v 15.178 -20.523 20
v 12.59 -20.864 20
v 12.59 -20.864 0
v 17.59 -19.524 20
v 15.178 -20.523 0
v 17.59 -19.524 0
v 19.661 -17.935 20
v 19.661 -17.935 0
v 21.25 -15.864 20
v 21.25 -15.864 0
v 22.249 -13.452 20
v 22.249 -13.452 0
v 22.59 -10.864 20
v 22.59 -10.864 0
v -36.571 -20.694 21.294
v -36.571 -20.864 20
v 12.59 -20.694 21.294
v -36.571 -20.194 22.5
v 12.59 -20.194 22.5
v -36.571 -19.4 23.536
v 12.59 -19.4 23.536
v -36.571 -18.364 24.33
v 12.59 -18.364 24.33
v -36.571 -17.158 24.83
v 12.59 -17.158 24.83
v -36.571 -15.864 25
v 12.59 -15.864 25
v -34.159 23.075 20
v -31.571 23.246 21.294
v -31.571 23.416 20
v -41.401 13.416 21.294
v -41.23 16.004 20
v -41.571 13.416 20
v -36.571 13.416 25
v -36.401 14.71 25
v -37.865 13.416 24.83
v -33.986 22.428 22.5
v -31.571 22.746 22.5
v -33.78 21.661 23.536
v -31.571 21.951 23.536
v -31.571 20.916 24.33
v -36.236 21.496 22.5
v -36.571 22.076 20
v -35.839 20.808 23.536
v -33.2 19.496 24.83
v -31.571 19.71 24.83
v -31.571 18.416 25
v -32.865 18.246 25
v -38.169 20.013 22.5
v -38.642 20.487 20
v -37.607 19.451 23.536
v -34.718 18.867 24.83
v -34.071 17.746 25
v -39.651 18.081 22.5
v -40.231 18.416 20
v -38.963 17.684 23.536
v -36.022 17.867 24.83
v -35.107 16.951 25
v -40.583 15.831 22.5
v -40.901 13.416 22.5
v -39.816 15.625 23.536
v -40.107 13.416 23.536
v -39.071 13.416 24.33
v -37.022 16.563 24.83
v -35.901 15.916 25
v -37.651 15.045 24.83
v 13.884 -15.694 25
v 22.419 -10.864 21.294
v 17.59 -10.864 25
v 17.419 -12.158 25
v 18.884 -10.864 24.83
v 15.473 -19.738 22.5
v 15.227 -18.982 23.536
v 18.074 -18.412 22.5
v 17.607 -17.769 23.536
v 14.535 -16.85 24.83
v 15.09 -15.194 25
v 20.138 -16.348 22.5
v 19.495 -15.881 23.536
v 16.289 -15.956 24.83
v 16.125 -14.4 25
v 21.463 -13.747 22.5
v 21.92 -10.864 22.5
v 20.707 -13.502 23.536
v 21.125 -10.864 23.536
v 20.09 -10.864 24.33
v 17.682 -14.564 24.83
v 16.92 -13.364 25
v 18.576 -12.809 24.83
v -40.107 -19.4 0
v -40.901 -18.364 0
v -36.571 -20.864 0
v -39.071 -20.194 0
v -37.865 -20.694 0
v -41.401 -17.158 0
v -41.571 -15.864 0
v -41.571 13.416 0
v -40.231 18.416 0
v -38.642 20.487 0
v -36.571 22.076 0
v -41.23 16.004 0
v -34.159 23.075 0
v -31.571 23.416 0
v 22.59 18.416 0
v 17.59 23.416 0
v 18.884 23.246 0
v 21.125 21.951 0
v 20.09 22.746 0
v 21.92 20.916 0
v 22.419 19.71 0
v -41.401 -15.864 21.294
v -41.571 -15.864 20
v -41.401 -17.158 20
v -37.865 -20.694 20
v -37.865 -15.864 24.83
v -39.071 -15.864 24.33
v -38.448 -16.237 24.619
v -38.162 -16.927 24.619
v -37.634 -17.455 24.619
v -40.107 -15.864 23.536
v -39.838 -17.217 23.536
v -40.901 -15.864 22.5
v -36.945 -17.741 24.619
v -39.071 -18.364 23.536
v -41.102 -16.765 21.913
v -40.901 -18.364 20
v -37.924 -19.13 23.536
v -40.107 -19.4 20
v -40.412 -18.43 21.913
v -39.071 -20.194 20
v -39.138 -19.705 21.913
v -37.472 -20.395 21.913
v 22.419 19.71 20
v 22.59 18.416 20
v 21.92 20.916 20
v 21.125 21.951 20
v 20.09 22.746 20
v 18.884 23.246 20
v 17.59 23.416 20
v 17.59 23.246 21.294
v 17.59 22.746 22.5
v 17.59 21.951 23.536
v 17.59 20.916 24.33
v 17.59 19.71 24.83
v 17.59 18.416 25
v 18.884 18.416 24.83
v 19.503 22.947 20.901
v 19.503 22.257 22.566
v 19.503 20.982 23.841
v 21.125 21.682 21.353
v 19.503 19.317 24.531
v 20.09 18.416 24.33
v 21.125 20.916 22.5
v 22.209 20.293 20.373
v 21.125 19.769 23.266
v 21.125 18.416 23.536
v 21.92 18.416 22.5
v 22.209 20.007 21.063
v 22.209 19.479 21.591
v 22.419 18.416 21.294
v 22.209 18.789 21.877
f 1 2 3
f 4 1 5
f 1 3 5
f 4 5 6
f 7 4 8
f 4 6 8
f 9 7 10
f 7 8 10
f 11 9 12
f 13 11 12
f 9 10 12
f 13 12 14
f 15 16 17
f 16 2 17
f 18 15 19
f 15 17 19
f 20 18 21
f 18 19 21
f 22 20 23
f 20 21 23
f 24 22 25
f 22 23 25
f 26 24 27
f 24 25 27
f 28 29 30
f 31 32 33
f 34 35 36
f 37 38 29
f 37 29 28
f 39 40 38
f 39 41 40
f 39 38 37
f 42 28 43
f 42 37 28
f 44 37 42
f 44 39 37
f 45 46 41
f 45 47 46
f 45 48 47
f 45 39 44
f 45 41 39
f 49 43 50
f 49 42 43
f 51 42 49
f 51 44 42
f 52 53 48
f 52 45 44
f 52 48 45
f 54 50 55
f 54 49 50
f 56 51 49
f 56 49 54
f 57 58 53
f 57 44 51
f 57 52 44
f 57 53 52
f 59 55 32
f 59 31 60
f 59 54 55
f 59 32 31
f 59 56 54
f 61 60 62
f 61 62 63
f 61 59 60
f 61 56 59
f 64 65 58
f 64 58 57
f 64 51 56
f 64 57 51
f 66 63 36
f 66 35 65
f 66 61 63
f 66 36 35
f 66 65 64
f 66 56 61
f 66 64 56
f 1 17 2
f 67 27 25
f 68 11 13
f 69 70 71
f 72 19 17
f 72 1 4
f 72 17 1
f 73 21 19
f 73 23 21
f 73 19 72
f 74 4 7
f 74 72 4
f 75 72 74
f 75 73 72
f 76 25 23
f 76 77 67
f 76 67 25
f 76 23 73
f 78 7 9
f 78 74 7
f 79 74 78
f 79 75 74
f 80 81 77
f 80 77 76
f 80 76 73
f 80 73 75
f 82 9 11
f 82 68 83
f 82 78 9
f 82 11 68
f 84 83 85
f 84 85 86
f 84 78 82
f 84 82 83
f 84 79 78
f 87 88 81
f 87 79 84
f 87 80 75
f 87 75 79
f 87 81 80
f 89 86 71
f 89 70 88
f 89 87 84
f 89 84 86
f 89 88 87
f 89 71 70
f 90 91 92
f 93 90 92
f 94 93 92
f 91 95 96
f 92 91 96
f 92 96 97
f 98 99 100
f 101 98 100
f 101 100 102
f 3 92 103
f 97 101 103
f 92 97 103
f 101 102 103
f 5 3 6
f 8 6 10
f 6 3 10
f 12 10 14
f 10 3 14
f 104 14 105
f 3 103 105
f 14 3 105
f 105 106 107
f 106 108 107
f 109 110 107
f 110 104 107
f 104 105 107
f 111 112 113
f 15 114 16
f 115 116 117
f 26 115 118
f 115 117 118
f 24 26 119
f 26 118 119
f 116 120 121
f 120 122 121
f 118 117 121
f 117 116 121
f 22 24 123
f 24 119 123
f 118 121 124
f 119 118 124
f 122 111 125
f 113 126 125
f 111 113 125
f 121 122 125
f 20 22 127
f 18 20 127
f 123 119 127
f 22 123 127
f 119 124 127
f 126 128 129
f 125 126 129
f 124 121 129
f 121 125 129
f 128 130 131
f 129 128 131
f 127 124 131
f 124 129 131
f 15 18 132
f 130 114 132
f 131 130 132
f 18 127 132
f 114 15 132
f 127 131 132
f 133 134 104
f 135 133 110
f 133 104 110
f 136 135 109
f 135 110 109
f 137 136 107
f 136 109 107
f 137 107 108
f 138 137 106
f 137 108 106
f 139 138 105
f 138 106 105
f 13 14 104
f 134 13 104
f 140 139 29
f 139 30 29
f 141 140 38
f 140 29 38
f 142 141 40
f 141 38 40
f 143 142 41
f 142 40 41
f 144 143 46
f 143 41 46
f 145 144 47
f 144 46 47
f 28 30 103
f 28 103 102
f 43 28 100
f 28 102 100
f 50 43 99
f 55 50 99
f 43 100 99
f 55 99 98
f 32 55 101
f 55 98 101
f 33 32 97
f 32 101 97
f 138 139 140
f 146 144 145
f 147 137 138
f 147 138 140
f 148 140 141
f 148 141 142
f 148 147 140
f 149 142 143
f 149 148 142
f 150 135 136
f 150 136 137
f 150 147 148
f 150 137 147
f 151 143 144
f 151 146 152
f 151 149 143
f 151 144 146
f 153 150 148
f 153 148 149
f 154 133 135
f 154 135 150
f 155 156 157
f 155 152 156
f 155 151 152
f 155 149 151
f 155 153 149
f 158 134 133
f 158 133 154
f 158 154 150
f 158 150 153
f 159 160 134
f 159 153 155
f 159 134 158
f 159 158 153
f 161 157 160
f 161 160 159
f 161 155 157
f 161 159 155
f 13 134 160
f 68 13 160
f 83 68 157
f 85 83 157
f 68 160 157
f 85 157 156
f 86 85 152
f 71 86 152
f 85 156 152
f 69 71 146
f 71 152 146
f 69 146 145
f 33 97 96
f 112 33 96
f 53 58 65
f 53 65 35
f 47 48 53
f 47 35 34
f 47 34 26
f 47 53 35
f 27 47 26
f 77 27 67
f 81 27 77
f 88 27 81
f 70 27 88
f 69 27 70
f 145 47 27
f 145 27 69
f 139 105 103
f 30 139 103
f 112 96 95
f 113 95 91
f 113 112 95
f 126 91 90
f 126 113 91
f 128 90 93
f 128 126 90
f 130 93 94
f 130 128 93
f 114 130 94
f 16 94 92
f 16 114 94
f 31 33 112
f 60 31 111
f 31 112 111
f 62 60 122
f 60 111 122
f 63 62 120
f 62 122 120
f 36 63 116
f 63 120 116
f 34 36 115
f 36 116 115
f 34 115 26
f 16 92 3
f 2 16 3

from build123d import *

# Parameters (mm, degrees)
F1_DEPTH    = 25
F2_R        = 5
F3_T1_DEPTH = 32.5
F3_S5_W     = 5
F3_S5_H     = 5
F3_T6_DEPTH = 5


# Not quite as in the source:
# - a fillet or chamfer that OpenCascade refuses, or shapes differently, is made with other operations: its cross-section is extruded or revolved along the edge and cut away or added


with BuildPart() as f1:
    # F0 (on Top) → F1 (new body)
    with BuildSketch(Plane.XY):
        with BuildLine():
            Line((22.5896425545, 23.4159377009), (-31.5712185204, 23.4159377009))
            ThreePointArc((-31.5712185204, 23.4159377009), (-38.6422863323, 20.4870055127), (-41.5712185204, 13.4159377009))
            Line((-41.5712185204, 13.4159377009), (-41.5712185204, -20.8640433848))
            Line((-41.5712185204, -20.8640433848), (12.5896425545, -20.8640433848))
            ThreePointArc((12.5896425545, -20.8640433848), (19.6607103664, -17.9351111967), (22.5896425545, -10.8640433848))
            Line((22.5896425545, -10.8640433848), (22.5896425545, 23.4159377009))
        make_face()
    extrude(amount=F1_DEPTH)

    # F2
    f2_edges = [f1.edges().sort_by_distance(p)[0] for p in [
        (-41.571219, -20.864043, 12.5),
        (-41.571219, -3.724053, 25),
        (-14.490788, -20.864043, 25),
    ]]
    fillet(f2_edges, radius=F2_R)

    # F3: fillet of radius 5 on 1 edges, made by hand

    # F3_s2 → F3_t1 (cut)
    with BuildSketch(Plane.XY.offset(-12.5)):
        with BuildLine():
            ThreePointArc((22.5896425545, 18.4159377009), (21.1251764605, 21.9514716068), (17.5896425545, 23.4159377009))
            Line((17.5896425545, 23.4159377009), (22.5896425545, 23.4159377009))
            Line((22.5896425545, 23.4159377009), (22.5896425545, 18.4159377009))
        make_face()
    extrude(amount=F3_T1_DEPTH, mode=Mode.SUBTRACT)


with BuildPart() as f3_tool4:
    # F3_s5 → F3_t6 (new body)
    with BuildSketch(Plane.YZ.offset(17.5896425545)):
        with Locations((20.9159377009, 22.5)):
            Rectangle(F3_S5_W, F3_S5_H)
    extrude(amount=F3_T6_DEPTH)

    # F3_s7 → F3_t8 (revolve, cut)
    with BuildSketch(Plane(origin=(17.5896425545, 18.4159377009, 20), x_dir=(0, -0.7071067812, -0.7071067812), z_dir=(0, -0.7071067812, 0.7071067812))):
        with BuildLine():
            ThreePointArc((0, -5), (5, 0), (0, 5))
            Line((0, 5), (0, -5))
        make_face()
    revolve(axis=Axis((17.5896425545, 18.4159377009, 20), (1, 0, 0)), mode=Mode.SUBTRACT)


with BuildPart() as f1_1:
    add(f1.part)

    # F3_t3: cut F3_tool4
    add(f3_tool4.part, mode=Mode.SUBTRACT)


solid = f1_1.part
